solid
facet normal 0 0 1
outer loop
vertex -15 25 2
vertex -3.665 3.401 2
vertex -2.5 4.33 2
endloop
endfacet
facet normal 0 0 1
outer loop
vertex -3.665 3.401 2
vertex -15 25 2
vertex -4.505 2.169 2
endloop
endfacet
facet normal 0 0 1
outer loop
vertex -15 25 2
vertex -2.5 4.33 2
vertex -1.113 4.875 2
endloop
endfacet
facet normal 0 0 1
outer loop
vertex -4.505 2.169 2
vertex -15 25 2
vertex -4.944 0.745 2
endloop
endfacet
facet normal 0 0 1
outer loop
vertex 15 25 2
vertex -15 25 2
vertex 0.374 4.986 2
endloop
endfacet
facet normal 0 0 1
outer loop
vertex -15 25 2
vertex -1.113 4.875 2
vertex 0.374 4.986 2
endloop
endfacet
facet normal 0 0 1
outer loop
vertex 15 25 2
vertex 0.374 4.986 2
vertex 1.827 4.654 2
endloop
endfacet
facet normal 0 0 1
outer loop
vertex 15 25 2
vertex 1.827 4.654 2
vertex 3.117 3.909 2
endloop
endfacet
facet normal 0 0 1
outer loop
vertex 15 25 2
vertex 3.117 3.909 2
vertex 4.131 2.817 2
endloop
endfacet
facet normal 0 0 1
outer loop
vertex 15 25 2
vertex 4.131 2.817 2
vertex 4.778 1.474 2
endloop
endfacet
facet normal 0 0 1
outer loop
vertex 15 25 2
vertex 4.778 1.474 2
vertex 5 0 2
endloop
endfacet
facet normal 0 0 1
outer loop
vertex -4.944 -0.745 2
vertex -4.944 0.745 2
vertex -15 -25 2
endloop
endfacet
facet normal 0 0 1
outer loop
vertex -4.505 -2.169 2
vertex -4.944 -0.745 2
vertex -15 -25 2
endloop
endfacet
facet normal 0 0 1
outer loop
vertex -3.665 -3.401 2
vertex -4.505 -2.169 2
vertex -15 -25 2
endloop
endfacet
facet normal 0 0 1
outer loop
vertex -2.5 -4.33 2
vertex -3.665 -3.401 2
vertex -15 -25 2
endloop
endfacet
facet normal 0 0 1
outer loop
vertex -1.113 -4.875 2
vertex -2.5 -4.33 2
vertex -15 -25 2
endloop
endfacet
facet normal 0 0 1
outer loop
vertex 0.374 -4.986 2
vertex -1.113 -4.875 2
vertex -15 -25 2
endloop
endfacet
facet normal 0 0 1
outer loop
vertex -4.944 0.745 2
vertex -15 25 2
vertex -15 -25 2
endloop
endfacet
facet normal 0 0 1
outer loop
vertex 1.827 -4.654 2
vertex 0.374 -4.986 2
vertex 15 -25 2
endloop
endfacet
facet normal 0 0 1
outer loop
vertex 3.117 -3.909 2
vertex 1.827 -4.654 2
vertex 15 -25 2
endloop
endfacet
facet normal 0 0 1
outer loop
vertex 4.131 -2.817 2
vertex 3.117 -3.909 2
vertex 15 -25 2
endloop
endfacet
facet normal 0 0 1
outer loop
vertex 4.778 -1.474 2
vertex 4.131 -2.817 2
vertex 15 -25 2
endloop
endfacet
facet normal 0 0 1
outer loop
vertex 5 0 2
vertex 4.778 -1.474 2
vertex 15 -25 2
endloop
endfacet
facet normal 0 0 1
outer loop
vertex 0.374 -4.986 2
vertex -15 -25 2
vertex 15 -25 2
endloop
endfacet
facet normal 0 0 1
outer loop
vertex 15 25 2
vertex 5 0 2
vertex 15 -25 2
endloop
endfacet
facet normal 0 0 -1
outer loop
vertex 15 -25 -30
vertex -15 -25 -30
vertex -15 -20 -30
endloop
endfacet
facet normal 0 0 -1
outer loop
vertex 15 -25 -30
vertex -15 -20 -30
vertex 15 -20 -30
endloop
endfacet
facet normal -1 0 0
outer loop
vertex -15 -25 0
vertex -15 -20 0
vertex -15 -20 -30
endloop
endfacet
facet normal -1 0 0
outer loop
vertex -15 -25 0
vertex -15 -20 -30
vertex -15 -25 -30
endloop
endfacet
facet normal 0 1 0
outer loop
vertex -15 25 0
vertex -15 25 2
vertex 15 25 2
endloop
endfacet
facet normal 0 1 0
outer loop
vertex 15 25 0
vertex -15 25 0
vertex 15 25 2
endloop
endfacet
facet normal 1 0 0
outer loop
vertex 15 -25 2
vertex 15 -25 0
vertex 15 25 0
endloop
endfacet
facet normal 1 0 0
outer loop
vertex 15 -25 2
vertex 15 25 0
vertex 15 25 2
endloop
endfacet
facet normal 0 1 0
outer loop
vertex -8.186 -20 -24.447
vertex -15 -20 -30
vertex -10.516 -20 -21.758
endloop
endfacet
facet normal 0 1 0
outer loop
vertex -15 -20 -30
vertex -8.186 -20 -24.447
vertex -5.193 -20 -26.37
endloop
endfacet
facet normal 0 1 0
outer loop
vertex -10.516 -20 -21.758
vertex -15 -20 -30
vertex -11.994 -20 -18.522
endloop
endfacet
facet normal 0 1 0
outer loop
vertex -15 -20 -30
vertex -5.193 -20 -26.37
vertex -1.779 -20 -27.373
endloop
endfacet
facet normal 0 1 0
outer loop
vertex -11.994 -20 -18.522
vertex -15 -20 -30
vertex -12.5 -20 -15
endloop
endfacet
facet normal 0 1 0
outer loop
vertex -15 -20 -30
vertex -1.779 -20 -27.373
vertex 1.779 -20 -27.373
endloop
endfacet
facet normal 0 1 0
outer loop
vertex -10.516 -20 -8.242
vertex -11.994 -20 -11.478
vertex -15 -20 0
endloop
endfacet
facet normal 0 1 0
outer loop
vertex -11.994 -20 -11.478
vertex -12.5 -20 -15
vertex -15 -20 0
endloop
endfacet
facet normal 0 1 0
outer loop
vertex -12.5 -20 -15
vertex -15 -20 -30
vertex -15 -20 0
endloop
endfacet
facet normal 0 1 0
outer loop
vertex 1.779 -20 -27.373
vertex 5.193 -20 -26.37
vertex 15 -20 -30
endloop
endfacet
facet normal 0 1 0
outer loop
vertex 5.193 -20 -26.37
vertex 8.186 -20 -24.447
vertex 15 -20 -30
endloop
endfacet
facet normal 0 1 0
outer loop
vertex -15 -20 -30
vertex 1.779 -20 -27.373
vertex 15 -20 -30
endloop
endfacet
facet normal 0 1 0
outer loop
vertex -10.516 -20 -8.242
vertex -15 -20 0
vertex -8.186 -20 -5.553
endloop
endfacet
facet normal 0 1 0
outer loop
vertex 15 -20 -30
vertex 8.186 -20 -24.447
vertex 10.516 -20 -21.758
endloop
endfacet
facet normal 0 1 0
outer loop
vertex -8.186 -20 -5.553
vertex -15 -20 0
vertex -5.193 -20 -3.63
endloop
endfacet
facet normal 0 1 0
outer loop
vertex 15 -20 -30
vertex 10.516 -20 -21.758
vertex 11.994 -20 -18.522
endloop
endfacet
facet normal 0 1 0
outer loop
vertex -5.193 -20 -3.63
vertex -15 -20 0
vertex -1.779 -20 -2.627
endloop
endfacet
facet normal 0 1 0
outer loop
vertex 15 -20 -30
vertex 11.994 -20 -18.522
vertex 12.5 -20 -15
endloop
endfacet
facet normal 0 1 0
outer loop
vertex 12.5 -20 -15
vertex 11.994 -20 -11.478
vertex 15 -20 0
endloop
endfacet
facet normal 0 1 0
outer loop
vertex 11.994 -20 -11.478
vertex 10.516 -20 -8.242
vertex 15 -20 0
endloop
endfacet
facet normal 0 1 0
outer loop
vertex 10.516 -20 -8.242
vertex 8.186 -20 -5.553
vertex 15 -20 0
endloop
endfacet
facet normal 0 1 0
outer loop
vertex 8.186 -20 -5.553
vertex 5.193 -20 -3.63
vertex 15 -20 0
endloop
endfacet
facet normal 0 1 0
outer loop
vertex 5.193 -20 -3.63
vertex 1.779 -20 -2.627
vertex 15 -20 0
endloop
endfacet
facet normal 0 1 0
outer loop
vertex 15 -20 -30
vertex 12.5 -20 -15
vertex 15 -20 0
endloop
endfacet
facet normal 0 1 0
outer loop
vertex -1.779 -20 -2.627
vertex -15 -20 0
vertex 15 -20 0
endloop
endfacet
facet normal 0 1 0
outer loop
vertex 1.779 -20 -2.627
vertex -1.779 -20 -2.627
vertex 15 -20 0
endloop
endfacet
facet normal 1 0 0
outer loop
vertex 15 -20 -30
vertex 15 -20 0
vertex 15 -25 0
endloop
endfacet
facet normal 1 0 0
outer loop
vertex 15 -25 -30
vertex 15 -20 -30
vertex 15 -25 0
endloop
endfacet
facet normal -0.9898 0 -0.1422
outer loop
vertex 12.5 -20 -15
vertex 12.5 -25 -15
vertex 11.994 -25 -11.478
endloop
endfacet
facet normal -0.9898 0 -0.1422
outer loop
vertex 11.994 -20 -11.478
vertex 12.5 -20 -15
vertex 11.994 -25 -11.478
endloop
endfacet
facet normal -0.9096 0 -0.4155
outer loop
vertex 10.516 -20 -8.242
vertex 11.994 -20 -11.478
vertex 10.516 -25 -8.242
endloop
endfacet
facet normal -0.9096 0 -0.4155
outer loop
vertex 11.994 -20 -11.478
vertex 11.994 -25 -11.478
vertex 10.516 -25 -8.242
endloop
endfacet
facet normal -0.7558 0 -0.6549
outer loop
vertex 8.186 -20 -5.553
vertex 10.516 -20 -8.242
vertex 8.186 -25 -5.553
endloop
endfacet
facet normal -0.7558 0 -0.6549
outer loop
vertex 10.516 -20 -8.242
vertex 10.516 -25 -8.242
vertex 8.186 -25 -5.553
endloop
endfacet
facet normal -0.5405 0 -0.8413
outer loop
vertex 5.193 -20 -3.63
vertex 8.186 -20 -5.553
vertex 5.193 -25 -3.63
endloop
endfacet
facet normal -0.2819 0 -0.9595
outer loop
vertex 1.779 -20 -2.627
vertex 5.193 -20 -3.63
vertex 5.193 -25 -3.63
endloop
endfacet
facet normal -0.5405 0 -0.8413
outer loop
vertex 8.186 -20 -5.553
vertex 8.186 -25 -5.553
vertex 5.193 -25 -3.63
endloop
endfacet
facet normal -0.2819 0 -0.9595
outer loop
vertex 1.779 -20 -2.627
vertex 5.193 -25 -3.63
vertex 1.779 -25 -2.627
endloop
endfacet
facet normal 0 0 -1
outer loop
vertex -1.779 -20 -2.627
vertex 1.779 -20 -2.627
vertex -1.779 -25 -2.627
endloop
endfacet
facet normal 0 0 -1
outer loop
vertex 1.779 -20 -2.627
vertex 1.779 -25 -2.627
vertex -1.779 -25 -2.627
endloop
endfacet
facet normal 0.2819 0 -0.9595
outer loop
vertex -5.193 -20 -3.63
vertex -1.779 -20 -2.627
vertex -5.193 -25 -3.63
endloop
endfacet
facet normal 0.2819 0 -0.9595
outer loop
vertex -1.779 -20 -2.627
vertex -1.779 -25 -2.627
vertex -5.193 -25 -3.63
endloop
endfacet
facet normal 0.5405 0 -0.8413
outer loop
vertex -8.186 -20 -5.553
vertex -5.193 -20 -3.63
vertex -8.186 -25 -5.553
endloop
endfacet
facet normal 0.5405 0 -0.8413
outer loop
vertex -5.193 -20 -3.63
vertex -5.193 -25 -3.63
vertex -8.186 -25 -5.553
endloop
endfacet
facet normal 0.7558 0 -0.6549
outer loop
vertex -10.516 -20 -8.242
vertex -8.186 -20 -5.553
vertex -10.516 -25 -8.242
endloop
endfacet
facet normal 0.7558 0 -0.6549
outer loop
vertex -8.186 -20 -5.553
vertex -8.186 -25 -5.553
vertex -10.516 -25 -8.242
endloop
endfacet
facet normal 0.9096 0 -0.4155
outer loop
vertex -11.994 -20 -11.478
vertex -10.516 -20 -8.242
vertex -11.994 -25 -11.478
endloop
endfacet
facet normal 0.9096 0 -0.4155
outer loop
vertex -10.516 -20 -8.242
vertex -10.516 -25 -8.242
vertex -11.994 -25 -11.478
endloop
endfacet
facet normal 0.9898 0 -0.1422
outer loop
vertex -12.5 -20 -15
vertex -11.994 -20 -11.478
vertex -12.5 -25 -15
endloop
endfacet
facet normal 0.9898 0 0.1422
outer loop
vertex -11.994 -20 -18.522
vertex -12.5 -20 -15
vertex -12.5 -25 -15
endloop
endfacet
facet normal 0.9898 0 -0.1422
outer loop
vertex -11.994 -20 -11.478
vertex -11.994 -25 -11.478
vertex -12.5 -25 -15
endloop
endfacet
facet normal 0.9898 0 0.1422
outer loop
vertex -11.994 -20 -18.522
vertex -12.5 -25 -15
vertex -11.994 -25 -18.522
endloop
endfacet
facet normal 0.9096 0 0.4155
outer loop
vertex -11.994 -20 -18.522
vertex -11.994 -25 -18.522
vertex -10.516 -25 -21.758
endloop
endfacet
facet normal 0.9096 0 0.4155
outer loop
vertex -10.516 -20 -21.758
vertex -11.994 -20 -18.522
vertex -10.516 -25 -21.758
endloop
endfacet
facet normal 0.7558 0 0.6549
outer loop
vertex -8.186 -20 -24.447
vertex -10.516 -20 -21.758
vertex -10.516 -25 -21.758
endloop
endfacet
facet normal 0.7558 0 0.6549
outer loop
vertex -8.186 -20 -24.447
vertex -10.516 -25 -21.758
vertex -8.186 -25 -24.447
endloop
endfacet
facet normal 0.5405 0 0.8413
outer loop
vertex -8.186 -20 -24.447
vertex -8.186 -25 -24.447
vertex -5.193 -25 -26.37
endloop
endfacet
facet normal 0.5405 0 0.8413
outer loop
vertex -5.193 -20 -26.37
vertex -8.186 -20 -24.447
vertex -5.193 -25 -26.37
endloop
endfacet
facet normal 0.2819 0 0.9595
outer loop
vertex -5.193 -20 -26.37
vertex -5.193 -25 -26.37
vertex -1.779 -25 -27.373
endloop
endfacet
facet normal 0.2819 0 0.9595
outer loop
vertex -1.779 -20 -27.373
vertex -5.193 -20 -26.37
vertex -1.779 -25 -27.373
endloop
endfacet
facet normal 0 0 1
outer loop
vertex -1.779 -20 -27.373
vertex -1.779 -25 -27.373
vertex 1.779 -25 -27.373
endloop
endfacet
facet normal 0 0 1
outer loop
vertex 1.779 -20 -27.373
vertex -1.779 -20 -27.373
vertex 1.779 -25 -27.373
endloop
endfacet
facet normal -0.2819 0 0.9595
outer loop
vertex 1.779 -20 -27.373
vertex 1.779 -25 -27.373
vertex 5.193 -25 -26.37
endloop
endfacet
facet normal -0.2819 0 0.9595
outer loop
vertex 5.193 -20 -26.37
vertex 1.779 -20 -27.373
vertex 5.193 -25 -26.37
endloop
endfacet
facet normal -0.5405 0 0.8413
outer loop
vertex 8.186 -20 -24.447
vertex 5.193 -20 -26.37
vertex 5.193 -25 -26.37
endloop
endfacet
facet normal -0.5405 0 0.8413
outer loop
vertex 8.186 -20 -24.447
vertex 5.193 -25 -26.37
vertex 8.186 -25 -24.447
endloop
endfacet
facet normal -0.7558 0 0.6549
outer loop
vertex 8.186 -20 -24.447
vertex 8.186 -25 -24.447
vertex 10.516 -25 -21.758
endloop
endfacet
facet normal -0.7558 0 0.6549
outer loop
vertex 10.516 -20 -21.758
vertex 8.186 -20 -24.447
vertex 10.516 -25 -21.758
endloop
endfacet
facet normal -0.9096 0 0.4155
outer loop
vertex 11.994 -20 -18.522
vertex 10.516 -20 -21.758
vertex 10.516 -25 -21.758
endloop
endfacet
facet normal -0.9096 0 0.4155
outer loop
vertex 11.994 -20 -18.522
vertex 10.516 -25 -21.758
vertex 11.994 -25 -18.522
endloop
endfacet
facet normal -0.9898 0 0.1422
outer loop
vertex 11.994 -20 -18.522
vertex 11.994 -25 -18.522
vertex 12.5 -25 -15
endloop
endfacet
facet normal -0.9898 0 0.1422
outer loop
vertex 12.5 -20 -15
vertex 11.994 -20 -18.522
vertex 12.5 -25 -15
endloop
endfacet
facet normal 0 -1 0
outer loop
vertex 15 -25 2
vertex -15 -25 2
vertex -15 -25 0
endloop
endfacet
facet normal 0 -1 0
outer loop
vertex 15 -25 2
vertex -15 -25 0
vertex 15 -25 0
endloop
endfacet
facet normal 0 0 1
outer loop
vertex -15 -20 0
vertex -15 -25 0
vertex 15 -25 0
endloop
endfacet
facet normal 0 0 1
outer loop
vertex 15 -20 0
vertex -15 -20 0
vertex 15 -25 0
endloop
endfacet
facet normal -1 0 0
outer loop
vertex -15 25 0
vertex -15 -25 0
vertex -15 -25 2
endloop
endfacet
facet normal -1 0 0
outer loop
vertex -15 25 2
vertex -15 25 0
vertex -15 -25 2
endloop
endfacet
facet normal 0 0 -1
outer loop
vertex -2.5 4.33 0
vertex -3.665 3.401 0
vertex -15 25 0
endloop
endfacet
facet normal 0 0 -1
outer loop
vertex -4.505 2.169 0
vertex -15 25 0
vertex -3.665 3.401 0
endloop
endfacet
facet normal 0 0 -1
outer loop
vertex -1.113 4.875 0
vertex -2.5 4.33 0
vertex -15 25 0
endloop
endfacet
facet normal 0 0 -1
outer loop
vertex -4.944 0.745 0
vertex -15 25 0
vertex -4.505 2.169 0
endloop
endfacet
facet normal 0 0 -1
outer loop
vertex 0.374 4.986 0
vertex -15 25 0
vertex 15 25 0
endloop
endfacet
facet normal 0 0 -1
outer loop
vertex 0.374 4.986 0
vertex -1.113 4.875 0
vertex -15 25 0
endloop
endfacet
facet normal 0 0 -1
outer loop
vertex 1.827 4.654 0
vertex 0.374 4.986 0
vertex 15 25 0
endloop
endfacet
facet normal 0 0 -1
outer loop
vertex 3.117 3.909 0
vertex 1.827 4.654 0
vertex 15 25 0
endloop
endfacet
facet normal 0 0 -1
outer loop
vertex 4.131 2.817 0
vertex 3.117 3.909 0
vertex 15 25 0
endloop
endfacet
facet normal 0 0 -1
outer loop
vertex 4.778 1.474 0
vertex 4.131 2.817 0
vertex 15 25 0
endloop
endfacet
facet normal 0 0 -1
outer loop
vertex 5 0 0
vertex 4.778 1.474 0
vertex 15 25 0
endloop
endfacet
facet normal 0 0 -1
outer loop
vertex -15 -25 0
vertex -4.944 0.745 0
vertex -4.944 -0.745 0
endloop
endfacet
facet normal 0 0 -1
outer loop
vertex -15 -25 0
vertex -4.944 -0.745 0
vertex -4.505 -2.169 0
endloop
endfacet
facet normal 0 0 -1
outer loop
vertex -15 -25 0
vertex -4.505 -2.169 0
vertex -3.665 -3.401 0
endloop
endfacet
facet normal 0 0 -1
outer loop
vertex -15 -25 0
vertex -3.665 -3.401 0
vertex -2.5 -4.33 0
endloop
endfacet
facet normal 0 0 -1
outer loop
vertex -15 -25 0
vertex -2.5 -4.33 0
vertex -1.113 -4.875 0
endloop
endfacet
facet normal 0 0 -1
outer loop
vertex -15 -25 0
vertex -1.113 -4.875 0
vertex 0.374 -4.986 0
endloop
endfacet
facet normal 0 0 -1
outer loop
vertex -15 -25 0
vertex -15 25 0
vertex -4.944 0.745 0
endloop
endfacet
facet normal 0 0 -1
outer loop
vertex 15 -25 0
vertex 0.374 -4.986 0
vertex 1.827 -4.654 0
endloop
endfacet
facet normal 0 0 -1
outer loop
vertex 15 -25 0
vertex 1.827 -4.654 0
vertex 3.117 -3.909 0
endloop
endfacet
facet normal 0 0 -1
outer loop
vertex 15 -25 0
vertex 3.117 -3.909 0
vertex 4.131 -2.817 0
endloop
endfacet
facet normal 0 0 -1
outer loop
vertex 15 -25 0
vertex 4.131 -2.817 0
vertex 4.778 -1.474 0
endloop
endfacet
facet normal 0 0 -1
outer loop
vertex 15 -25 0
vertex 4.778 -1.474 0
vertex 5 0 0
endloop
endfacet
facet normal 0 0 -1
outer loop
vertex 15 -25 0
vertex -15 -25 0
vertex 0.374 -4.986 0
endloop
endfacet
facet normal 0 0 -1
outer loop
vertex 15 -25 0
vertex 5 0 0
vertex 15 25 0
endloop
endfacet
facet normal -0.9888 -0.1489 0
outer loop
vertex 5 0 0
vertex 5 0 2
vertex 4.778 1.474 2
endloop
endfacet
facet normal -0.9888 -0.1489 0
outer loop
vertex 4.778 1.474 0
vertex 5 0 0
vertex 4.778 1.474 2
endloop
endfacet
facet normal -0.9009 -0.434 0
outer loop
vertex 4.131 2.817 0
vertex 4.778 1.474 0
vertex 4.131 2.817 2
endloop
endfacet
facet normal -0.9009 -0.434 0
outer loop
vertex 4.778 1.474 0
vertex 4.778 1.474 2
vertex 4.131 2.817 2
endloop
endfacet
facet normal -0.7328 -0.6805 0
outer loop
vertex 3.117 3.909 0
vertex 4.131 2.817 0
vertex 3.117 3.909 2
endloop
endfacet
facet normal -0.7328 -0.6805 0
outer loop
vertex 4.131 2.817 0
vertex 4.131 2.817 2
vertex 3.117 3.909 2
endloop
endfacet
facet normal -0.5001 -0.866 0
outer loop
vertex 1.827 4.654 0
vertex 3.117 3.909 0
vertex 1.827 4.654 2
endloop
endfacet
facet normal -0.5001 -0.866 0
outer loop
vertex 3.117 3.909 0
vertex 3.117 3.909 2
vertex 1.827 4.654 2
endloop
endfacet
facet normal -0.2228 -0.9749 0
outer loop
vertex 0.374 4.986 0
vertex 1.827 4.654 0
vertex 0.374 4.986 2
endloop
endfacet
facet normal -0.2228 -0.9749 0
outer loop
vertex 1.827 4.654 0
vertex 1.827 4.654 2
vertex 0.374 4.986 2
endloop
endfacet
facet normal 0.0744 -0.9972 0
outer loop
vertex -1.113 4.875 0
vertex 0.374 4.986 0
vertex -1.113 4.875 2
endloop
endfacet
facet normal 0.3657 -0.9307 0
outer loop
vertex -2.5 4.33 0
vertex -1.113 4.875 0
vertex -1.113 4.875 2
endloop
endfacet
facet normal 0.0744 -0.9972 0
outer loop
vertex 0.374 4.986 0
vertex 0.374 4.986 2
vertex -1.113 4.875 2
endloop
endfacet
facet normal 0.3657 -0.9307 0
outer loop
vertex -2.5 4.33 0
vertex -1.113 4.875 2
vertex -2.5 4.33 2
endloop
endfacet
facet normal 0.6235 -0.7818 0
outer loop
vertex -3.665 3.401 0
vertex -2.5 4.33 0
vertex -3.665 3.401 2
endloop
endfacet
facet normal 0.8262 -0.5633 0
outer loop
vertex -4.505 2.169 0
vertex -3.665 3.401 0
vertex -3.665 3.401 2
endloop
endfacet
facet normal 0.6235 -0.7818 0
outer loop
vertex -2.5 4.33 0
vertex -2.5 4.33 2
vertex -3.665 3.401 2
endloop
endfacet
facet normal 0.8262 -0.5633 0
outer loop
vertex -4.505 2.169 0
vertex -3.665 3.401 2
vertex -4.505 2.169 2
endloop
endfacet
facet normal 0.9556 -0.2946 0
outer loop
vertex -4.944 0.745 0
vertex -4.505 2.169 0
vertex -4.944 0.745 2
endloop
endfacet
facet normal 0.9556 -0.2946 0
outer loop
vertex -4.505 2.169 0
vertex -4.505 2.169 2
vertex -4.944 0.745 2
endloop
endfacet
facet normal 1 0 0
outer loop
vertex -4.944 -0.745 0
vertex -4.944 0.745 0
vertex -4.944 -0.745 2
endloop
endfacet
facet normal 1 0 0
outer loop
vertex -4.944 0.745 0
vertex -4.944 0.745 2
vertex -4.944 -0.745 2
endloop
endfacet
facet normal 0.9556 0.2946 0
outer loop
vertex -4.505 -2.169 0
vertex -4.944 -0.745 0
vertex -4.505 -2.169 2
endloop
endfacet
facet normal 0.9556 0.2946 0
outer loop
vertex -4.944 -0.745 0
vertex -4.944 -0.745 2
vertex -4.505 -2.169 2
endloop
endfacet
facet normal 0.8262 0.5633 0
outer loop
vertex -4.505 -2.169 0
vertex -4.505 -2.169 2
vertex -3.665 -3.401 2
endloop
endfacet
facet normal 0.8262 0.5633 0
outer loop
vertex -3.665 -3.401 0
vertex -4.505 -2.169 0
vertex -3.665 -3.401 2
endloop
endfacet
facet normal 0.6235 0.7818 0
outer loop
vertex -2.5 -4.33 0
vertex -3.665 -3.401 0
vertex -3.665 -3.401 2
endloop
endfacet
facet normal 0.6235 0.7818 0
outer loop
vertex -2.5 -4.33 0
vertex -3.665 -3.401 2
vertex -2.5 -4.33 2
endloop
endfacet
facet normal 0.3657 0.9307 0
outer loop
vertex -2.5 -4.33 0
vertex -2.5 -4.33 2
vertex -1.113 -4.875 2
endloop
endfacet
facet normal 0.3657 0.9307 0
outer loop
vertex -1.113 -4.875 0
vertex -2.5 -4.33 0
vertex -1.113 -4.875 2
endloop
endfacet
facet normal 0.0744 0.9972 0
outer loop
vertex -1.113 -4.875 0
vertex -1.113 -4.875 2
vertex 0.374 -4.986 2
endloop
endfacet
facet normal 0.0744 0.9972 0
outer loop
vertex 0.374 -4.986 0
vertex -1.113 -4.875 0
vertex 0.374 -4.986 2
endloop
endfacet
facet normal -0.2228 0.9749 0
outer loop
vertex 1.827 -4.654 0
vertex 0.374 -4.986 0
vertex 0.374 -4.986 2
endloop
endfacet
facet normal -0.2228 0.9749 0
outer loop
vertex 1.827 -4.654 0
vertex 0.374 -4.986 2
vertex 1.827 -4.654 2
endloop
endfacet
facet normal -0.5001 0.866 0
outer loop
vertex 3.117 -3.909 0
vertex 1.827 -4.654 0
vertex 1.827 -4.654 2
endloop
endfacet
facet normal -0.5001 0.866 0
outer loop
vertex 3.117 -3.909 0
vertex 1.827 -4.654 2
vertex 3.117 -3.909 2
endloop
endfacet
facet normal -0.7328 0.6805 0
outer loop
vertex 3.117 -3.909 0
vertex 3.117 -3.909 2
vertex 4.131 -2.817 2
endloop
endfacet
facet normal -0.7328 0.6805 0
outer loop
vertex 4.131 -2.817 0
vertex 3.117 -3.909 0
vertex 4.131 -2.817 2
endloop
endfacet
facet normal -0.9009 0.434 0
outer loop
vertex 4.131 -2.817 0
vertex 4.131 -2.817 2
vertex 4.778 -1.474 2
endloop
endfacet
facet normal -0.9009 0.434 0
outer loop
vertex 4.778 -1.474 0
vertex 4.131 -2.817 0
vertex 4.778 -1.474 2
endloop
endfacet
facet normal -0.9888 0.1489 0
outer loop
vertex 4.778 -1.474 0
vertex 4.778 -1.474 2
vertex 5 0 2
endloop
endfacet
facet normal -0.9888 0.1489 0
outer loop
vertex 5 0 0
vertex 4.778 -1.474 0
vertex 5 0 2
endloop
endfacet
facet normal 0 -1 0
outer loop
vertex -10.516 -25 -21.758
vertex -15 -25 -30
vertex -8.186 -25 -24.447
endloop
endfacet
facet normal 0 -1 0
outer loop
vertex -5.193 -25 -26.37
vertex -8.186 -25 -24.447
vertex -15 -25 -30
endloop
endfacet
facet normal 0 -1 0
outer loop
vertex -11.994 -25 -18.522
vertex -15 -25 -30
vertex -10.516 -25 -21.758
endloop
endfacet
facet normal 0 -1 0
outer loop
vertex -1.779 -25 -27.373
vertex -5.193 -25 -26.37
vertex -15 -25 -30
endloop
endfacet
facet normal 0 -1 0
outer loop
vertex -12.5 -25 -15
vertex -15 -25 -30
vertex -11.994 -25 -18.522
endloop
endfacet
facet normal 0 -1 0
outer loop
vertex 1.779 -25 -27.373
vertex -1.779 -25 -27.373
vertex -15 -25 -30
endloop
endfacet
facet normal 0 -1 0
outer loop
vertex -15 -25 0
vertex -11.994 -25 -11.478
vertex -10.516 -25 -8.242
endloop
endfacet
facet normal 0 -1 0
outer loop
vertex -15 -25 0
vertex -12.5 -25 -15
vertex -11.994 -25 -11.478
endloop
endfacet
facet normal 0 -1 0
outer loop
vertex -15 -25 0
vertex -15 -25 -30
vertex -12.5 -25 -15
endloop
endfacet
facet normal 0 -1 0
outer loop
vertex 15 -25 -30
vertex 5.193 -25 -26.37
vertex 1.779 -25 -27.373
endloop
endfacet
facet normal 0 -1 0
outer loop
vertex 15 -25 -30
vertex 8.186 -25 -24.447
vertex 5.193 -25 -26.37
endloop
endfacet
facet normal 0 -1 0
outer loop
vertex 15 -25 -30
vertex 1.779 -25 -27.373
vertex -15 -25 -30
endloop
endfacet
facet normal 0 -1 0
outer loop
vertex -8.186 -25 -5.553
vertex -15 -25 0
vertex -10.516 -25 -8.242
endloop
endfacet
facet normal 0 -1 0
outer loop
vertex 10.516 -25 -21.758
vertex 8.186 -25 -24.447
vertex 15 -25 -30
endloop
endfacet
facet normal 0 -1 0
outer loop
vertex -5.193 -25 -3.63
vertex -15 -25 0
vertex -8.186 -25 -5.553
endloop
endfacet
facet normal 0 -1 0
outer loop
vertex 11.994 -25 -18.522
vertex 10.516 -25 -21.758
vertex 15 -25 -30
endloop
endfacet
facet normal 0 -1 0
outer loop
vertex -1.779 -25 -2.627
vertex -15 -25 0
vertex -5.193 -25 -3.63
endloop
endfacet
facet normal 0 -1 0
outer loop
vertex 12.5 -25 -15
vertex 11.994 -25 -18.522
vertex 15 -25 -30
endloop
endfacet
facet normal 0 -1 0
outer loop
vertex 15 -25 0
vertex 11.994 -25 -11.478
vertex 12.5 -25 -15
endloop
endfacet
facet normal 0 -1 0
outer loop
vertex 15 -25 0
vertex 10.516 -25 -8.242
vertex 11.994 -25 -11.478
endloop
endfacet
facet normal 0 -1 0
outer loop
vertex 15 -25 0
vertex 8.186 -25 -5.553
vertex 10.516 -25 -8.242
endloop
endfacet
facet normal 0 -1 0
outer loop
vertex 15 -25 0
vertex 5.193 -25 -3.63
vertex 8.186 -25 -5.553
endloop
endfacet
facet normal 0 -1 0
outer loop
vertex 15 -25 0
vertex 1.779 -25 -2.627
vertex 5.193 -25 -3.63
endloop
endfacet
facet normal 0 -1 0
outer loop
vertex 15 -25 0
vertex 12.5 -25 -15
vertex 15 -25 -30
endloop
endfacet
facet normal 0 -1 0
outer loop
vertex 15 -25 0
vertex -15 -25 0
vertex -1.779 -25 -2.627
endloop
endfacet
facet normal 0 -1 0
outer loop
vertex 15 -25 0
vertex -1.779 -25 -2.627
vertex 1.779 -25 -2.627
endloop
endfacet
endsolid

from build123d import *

# Parameters (mm, degrees)
F0_W     = 30
F0_H     = 2
F1_DEPTH = 25
F2_R     = 5
F3_DEPTH = 2.001
F4_W     = 30
F4_H     = 5
F5_DEPTH = 30
F6_R     = 12.5
F7_DEPTH = 50.001


with BuildPart() as f1:
    # F0 (on Front) → F1 (new body, symmetric)
    with BuildSketch(Plane.XZ):
        with Locations((0, 1)):
            Rectangle(F0_W, F0_H)
    extrude(amount=F1_DEPTH, both=True)

    # F2 (on face) → F3 (cut, through all)
    with BuildSketch(Plane.XY.offset(2)):
        Circle(F2_R)
    extrude(amount=-F3_DEPTH, mode=Mode.SUBTRACT)


with BuildPart() as f5:
    # F4 (on face) → F5 (new body)
    with BuildSketch(Plane(origin=(0, 0, 0), x_dir=(1, 0, 0), z_dir=(0, 0, -1))):
        with Locations((0, 22.5)):
            Rectangle(F4_W, F4_H)
    extrude(amount=F5_DEPTH)

    # F6 (on face) → F7 (cut, through all)
    with BuildSketch(Plane.XZ.offset(25)):
        with Locations((0, -15)):
            Circle(F6_R)
    extrude(amount=-F7_DEPTH, mode=Mode.SUBTRACT)


solid = Compound([f1.part, f5.part])
